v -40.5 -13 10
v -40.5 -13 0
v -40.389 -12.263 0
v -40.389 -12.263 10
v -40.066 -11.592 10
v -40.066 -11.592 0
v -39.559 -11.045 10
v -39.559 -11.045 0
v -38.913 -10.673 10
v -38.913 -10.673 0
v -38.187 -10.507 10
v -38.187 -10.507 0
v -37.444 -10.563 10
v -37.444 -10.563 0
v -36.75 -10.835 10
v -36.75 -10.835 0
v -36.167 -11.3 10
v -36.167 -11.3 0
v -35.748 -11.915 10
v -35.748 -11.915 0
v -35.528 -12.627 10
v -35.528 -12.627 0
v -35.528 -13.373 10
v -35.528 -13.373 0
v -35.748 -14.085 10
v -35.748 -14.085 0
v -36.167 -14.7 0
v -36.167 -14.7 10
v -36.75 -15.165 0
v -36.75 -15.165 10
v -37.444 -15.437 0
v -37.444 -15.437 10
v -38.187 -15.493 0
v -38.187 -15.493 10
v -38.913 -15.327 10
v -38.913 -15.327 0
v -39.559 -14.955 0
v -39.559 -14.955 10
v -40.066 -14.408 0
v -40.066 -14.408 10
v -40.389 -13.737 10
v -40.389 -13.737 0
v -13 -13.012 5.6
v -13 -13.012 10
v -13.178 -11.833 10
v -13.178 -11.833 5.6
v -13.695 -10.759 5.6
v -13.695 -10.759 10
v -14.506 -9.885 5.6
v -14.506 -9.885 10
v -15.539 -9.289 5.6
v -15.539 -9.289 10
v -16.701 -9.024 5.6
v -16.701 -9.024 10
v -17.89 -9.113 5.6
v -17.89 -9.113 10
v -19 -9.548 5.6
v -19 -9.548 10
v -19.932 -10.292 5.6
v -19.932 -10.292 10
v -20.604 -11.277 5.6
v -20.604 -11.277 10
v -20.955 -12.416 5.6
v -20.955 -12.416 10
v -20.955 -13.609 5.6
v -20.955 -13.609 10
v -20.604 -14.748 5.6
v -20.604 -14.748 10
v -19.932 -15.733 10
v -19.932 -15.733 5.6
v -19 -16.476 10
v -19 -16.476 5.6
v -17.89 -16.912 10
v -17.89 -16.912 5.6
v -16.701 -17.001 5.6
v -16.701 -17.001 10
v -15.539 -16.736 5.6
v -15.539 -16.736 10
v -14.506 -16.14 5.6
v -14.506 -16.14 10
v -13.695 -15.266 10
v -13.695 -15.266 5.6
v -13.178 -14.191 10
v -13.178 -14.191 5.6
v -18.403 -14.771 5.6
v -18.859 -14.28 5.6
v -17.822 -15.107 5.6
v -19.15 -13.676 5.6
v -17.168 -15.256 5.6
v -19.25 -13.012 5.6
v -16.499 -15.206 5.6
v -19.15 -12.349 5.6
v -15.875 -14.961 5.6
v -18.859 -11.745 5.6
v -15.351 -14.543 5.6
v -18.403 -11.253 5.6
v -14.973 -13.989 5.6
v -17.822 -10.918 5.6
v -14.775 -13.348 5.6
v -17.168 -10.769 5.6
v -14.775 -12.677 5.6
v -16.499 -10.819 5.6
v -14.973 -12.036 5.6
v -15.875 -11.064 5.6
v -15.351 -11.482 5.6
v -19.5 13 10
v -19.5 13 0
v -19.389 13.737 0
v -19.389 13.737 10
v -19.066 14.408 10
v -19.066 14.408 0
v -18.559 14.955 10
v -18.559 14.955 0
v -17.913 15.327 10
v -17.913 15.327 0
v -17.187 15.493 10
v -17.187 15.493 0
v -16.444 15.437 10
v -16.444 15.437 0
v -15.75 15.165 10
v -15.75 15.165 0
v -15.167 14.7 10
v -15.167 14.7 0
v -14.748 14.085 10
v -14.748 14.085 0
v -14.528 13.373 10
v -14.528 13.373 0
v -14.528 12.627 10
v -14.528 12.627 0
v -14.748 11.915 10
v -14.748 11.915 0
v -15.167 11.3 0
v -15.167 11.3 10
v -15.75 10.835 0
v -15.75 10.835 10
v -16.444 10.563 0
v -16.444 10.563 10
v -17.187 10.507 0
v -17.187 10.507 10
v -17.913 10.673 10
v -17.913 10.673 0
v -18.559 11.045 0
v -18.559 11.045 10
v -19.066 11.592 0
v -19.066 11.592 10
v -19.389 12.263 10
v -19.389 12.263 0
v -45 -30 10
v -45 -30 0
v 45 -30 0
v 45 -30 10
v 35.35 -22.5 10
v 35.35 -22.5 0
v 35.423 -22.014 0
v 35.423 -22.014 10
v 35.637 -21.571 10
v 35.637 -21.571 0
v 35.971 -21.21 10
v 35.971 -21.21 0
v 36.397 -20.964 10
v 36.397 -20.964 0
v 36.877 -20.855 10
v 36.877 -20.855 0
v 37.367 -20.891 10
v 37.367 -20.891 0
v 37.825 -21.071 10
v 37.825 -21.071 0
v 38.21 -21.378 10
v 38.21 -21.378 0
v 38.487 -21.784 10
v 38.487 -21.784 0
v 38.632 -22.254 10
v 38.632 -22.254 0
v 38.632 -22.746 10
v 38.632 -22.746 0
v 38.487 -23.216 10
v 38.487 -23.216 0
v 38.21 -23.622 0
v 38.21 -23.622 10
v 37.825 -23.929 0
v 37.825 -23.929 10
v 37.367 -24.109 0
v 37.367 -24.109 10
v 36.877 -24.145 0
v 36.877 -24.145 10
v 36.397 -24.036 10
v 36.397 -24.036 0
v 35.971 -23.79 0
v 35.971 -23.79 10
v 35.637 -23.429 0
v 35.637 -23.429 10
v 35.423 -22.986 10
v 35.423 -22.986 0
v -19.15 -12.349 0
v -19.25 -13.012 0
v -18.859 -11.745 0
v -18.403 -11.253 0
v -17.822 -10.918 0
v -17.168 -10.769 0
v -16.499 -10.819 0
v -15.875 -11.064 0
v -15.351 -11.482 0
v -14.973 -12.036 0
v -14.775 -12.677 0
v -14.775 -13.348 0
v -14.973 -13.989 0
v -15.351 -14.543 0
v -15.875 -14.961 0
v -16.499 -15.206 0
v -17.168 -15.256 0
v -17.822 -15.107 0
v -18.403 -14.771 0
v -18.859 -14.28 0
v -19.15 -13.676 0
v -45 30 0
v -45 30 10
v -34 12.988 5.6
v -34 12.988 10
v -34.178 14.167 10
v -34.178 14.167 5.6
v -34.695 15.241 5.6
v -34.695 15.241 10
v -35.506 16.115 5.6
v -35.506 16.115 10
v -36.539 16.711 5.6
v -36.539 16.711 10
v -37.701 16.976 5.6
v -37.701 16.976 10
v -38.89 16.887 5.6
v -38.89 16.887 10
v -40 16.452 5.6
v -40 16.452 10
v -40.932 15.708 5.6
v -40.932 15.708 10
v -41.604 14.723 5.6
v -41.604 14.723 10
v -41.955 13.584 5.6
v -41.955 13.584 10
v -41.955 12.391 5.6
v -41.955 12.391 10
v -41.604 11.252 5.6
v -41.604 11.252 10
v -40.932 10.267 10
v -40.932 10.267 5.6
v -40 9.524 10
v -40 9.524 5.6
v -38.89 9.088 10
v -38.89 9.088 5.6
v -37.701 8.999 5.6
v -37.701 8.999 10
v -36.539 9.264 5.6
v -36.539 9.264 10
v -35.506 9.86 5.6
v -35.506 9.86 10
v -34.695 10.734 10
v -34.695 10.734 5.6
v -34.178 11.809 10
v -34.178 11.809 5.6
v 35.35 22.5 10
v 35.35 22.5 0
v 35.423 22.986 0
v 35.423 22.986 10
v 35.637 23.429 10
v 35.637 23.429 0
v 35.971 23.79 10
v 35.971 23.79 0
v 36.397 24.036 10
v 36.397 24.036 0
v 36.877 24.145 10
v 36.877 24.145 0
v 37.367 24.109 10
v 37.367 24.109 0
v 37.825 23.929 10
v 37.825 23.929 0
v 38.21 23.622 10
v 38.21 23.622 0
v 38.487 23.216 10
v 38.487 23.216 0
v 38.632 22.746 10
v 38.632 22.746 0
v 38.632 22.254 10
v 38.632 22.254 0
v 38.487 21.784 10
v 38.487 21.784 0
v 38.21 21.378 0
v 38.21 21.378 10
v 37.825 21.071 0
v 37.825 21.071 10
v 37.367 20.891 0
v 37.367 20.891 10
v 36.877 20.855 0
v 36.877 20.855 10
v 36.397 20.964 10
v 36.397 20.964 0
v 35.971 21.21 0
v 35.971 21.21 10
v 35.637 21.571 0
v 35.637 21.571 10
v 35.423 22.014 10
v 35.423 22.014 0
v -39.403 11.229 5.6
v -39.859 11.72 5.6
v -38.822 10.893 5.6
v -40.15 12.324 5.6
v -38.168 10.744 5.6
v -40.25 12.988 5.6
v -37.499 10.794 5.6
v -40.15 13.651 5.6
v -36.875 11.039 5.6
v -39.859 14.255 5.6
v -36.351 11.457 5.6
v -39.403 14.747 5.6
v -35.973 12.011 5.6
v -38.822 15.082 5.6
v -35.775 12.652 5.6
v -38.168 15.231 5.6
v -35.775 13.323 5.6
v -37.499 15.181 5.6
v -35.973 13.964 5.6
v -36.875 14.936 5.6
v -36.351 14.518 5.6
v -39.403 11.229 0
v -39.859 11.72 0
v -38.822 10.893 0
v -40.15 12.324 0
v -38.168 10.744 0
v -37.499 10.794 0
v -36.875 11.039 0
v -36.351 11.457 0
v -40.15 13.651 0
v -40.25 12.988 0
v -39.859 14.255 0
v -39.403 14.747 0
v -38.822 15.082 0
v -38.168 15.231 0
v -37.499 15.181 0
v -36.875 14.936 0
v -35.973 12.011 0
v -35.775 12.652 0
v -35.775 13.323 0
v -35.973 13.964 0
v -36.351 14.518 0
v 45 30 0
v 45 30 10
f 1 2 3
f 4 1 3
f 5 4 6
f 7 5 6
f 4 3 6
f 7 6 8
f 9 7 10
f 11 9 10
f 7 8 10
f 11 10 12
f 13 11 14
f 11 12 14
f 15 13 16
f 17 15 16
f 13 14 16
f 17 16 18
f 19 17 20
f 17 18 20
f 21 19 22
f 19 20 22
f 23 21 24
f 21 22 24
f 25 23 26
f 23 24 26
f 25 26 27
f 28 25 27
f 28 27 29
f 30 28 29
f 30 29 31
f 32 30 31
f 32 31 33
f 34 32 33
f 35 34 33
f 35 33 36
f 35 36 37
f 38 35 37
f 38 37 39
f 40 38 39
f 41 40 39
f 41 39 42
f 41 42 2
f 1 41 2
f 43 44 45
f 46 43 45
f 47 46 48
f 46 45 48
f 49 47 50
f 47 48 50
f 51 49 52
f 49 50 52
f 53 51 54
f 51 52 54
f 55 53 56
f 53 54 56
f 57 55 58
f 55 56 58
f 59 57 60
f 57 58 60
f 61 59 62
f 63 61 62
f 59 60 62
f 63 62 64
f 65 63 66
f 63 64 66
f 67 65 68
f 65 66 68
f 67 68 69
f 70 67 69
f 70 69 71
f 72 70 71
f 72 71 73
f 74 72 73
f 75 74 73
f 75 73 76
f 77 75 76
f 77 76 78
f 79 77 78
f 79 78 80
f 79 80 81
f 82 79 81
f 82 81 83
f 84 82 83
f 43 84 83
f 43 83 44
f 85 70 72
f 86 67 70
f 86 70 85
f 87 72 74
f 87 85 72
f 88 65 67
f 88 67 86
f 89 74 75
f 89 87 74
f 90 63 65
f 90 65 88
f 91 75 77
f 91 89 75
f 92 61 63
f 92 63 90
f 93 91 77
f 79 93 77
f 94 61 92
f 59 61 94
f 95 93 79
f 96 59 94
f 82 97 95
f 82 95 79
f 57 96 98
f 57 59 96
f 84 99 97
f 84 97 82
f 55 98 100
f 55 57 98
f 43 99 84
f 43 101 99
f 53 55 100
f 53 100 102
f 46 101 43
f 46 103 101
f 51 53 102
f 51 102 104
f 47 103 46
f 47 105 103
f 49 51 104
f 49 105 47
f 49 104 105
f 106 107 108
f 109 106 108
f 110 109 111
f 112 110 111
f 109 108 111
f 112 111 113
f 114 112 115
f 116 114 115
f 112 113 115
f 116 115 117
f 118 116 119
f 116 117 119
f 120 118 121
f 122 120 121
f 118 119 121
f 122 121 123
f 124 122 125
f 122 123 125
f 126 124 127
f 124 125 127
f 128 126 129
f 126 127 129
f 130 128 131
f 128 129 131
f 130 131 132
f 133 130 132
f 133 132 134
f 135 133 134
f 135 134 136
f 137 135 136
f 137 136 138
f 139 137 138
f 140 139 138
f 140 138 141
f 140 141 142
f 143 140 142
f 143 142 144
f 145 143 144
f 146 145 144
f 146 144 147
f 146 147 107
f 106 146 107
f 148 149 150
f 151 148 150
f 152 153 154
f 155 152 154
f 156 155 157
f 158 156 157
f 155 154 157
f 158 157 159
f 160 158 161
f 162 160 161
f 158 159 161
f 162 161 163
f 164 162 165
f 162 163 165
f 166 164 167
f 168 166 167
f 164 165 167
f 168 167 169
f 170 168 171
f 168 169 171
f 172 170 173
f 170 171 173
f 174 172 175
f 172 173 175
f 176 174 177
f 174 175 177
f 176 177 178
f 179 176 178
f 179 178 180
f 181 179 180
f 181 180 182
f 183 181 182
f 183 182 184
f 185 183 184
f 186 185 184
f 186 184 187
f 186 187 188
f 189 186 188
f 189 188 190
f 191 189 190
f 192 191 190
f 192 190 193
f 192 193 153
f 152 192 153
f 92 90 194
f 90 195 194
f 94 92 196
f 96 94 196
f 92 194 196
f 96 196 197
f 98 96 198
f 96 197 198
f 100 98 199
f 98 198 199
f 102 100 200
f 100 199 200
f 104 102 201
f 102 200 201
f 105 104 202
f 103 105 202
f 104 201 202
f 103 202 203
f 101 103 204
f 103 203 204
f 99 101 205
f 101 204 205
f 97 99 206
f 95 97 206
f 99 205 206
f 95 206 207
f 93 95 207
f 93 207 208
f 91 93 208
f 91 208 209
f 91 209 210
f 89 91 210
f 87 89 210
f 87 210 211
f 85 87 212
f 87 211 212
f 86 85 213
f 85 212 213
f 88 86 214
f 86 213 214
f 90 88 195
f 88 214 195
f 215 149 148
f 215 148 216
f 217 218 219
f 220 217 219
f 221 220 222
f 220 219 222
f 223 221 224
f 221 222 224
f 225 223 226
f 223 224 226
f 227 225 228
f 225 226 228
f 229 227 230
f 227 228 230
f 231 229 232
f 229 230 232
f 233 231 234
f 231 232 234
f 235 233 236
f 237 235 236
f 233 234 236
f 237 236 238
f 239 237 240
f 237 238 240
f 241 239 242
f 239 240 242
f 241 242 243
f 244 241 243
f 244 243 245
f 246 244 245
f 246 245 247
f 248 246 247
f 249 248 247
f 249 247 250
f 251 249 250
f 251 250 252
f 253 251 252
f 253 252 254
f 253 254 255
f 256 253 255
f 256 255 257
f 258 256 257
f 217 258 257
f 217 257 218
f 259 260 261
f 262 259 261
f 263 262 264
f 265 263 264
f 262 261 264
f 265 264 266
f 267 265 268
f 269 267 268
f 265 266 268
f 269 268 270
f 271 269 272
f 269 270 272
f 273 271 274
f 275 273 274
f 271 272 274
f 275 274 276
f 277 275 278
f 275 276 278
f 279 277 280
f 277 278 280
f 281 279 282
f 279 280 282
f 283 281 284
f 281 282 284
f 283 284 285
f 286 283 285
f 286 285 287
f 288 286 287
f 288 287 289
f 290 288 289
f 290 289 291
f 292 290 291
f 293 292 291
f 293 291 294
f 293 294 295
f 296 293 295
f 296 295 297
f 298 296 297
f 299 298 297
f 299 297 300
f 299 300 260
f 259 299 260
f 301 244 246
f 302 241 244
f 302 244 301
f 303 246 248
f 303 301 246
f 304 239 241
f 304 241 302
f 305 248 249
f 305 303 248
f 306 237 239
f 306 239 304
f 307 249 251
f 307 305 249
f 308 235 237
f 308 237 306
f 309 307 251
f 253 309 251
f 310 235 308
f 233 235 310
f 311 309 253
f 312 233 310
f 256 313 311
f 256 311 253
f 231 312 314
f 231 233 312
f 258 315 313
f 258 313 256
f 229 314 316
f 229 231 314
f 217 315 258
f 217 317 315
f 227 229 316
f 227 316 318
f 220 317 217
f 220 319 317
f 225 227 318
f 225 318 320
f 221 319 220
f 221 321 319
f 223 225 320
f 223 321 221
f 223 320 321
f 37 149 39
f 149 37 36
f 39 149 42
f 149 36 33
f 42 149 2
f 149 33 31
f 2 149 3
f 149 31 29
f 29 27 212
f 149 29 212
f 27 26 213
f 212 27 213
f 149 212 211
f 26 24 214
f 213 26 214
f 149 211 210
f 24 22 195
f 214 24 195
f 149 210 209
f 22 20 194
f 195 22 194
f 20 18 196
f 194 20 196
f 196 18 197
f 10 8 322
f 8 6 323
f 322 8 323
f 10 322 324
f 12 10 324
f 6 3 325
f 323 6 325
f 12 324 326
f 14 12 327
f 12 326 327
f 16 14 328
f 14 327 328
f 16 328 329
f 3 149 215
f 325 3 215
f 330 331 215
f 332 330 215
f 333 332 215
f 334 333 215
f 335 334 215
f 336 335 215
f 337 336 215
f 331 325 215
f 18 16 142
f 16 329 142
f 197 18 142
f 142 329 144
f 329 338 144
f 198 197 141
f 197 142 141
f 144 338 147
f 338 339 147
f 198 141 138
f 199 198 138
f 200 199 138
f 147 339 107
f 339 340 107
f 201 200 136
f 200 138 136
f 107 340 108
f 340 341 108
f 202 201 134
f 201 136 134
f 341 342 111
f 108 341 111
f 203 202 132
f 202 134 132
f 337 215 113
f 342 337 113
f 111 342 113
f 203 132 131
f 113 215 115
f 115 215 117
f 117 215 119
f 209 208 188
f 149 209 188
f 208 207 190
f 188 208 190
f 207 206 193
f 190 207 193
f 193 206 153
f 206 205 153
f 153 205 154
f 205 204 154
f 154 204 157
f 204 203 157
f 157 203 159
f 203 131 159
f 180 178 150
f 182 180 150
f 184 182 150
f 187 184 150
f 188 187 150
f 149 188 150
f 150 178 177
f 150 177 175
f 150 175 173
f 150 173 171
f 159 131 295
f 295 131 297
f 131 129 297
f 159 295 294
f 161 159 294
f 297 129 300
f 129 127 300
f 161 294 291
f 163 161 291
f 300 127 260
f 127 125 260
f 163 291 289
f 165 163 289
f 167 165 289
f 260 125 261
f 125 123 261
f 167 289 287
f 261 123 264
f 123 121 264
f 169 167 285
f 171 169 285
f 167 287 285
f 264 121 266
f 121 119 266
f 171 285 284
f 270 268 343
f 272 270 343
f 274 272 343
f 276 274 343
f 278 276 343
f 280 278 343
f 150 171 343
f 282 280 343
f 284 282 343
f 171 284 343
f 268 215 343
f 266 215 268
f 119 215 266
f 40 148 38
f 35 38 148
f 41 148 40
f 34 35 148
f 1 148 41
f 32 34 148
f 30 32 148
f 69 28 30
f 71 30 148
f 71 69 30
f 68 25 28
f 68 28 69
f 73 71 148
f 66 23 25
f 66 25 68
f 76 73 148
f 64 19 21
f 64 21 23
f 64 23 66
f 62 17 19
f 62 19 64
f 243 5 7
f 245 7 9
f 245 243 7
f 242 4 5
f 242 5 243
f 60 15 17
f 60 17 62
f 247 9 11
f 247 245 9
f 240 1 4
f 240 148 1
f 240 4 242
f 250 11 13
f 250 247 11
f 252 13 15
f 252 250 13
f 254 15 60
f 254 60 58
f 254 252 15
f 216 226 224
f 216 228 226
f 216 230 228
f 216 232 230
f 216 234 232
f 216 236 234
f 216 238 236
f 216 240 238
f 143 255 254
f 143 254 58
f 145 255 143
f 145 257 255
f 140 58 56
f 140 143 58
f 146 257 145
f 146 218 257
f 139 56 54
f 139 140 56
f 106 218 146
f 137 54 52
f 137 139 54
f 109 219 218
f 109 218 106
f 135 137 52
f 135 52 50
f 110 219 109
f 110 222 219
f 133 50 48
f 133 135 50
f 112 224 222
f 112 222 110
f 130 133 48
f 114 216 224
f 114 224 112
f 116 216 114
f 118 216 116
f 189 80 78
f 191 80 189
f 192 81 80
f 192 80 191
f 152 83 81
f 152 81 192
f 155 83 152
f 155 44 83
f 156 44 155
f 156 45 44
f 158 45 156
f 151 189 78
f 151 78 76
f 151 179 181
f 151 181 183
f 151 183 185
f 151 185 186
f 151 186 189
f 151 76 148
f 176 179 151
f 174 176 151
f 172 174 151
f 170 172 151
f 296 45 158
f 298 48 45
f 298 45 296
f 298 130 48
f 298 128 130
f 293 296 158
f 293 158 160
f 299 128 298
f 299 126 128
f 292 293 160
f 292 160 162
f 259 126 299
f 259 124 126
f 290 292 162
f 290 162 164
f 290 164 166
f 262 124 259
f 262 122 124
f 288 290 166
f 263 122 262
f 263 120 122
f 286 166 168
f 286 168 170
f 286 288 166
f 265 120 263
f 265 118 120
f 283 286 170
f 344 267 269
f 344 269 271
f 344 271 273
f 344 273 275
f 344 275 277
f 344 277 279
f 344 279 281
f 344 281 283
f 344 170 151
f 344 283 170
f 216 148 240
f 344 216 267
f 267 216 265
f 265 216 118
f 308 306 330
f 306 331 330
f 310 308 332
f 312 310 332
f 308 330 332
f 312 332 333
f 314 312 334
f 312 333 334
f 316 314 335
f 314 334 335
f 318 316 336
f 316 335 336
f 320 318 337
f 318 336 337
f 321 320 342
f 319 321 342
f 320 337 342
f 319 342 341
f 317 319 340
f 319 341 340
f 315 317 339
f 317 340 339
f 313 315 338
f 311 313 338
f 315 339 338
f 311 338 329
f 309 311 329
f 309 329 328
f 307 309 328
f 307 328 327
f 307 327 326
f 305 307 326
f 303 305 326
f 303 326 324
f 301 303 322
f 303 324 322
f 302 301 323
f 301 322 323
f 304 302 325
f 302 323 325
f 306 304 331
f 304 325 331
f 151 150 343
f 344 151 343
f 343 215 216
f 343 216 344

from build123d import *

# Parameters (mm, degrees)
F0_W           = 90
F0_H           = 60
F1_DEPTH       = 10
F3_D           = 4.5
F3_CBORE_D     = 8
F3_CBORE_DEPTH = 4.4
F5_D           = 5
F7_D           = 3.3


with BuildPart() as f1:
    # F0 (on Top) → F1 (new body)
    with BuildSketch(Plane.XY):
        Rectangle(F0_W, F0_H)
    extrude(amount=F1_DEPTH)

    # F3 (through all)
    with Locations(Plane.XY.offset(10)):
        with Locations((-38, 12.9876444116), (-17, -13.0123555884)):
            CounterBoreHole(F3_D / 2, F3_CBORE_D / 2, F3_CBORE_DEPTH)

    # F5 (through all)
    with Locations(Plane.XY.offset(10)):
        with Locations((-38, -13), (-17, 13)):
            Hole(F5_D / 2)

    # F7 (through all)
    with Locations(Plane.XY.offset(10)):
        with Locations((37, 22.5), (37, -22.5)):
            Hole(F7_D / 2)


solid = f1.part
